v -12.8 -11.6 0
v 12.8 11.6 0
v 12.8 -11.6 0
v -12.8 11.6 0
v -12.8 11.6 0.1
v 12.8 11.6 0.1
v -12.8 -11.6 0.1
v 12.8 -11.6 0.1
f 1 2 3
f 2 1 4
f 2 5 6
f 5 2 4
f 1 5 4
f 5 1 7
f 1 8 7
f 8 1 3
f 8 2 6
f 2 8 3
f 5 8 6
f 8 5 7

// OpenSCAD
// file: ../p/box5-12.scad
use <../lib.scad>
function ldraw_lib__box5_12() = [
// 0 Box with 5 Faces without Any Edges
// 0 Name: box5-12.dat
// 0 Author: Chris Dee [cwdee]
// 0 !LDRAW_ORG Primitive UPDATE 2009-02
// 0 !LICENSE Licensed under CC BY 4.0 : see CAreadme.txt
// 
// 0 BFC CERTIFY CCW
  [0,"BFC","CERTIFY"],
  [0,"BFC","CCW"],
// 
// 0 !HISTORY 2009-09-03 [PTadmin] Official Update 2009-02
// 
// 
// 4 16 1 1 1 1 1 -1 -1 1 -1 -1 1 1
  [4,16,1,1,1,1,1,-1,-1,1,-1,-1,1,1],
// 4 16 -1 0 1 1 0 1 1 1 1 -1 1 1
  [4,16,-1,0,1,1,0,1,1,1,1,-1,1,1],
// 4 16 -1 0 -1 -1 0 1 -1 1 1 -1 1 -1
  [4,16,-1,0,-1,-1,0,1,-1,1,1,-1,1,-1],
// 4 16 1 0 -1 -1 0 -1 -1 1 -1 1 1 -1
  [4,16,1,0,-1,-1,0,-1,-1,1,-1,1,1,-1],
// 4 16 1 0 1 1 0 -1 1 1 -1 1 1 1
  [4,16,1,0,1,1,0,-1,1,1,-1,1,1,1],
// 0
];
module ldraw_lib__box5_12(step=0, col=false, unit=2/5, alt=false, line=0.2, solid=!$preview)
    makepoly(ldraw_lib__box5_12(), step=step, col=col, unit=unit, alt=alt, line=line, solid=solid);
ldraw_lib__box5_12(line=0.2);
// main file
use <../lib.scad>
use <../p/box5-12.scad>
function ldraw_lib__4620860e() = [
// 0 Sticker  2.9 x  3.2 with Chrome Silver Mirror
// 0 Name: 4620860e.dat
// 0 Author: Takeshi Takahashi [RainbowDolphin]
// 0 !LDRAW_ORG Part UPDATE 2024-09
// 0 !LICENSE Licensed under CC BY 4.0 : see CAreadme.txt
// 
// 0 BFC CERTIFY CCW
  [0,"BFC","CERTIFY"],
  [0,"BFC","CCW"],
// 
// 0 !KEYWORDS Bricklink 3315stk01, Brickowl 604777, Dresser, house, Olivia
// 0 !KEYWORDS Rebrickable 95460, set 3315
// 
// 0 !HISTORY 2024-10-27 [OrionP] Official Update 2024-09
// 
// 
// 1 16 0 -0.25 0 32 0 0 0 0.25 0 0 0 29 box5-12.dat
  [1,16,0,-0.25,0,32,0,0,0,0.25,0,0,0,29, ldraw_lib__box5_12()],
// 
// 4 383 32 -0.25 29 -32 -0.25 29 -32 -0.25 -29 32 -0.25 -29
  [4,383,32,-0.25,29,-32,-0.25,29,-32,-0.25,-29,32,-0.25,-29],
];
module ldraw_lib__4620860e(step=0, col=false, unit=2/5, alt=false, line=0.2, solid=!$preview)
    makepoly(ldraw_lib__4620860e(), step=step, col=col, unit=unit, alt=alt, line=line, solid=solid);
ldraw_lib__4620860e(line=0.2);
